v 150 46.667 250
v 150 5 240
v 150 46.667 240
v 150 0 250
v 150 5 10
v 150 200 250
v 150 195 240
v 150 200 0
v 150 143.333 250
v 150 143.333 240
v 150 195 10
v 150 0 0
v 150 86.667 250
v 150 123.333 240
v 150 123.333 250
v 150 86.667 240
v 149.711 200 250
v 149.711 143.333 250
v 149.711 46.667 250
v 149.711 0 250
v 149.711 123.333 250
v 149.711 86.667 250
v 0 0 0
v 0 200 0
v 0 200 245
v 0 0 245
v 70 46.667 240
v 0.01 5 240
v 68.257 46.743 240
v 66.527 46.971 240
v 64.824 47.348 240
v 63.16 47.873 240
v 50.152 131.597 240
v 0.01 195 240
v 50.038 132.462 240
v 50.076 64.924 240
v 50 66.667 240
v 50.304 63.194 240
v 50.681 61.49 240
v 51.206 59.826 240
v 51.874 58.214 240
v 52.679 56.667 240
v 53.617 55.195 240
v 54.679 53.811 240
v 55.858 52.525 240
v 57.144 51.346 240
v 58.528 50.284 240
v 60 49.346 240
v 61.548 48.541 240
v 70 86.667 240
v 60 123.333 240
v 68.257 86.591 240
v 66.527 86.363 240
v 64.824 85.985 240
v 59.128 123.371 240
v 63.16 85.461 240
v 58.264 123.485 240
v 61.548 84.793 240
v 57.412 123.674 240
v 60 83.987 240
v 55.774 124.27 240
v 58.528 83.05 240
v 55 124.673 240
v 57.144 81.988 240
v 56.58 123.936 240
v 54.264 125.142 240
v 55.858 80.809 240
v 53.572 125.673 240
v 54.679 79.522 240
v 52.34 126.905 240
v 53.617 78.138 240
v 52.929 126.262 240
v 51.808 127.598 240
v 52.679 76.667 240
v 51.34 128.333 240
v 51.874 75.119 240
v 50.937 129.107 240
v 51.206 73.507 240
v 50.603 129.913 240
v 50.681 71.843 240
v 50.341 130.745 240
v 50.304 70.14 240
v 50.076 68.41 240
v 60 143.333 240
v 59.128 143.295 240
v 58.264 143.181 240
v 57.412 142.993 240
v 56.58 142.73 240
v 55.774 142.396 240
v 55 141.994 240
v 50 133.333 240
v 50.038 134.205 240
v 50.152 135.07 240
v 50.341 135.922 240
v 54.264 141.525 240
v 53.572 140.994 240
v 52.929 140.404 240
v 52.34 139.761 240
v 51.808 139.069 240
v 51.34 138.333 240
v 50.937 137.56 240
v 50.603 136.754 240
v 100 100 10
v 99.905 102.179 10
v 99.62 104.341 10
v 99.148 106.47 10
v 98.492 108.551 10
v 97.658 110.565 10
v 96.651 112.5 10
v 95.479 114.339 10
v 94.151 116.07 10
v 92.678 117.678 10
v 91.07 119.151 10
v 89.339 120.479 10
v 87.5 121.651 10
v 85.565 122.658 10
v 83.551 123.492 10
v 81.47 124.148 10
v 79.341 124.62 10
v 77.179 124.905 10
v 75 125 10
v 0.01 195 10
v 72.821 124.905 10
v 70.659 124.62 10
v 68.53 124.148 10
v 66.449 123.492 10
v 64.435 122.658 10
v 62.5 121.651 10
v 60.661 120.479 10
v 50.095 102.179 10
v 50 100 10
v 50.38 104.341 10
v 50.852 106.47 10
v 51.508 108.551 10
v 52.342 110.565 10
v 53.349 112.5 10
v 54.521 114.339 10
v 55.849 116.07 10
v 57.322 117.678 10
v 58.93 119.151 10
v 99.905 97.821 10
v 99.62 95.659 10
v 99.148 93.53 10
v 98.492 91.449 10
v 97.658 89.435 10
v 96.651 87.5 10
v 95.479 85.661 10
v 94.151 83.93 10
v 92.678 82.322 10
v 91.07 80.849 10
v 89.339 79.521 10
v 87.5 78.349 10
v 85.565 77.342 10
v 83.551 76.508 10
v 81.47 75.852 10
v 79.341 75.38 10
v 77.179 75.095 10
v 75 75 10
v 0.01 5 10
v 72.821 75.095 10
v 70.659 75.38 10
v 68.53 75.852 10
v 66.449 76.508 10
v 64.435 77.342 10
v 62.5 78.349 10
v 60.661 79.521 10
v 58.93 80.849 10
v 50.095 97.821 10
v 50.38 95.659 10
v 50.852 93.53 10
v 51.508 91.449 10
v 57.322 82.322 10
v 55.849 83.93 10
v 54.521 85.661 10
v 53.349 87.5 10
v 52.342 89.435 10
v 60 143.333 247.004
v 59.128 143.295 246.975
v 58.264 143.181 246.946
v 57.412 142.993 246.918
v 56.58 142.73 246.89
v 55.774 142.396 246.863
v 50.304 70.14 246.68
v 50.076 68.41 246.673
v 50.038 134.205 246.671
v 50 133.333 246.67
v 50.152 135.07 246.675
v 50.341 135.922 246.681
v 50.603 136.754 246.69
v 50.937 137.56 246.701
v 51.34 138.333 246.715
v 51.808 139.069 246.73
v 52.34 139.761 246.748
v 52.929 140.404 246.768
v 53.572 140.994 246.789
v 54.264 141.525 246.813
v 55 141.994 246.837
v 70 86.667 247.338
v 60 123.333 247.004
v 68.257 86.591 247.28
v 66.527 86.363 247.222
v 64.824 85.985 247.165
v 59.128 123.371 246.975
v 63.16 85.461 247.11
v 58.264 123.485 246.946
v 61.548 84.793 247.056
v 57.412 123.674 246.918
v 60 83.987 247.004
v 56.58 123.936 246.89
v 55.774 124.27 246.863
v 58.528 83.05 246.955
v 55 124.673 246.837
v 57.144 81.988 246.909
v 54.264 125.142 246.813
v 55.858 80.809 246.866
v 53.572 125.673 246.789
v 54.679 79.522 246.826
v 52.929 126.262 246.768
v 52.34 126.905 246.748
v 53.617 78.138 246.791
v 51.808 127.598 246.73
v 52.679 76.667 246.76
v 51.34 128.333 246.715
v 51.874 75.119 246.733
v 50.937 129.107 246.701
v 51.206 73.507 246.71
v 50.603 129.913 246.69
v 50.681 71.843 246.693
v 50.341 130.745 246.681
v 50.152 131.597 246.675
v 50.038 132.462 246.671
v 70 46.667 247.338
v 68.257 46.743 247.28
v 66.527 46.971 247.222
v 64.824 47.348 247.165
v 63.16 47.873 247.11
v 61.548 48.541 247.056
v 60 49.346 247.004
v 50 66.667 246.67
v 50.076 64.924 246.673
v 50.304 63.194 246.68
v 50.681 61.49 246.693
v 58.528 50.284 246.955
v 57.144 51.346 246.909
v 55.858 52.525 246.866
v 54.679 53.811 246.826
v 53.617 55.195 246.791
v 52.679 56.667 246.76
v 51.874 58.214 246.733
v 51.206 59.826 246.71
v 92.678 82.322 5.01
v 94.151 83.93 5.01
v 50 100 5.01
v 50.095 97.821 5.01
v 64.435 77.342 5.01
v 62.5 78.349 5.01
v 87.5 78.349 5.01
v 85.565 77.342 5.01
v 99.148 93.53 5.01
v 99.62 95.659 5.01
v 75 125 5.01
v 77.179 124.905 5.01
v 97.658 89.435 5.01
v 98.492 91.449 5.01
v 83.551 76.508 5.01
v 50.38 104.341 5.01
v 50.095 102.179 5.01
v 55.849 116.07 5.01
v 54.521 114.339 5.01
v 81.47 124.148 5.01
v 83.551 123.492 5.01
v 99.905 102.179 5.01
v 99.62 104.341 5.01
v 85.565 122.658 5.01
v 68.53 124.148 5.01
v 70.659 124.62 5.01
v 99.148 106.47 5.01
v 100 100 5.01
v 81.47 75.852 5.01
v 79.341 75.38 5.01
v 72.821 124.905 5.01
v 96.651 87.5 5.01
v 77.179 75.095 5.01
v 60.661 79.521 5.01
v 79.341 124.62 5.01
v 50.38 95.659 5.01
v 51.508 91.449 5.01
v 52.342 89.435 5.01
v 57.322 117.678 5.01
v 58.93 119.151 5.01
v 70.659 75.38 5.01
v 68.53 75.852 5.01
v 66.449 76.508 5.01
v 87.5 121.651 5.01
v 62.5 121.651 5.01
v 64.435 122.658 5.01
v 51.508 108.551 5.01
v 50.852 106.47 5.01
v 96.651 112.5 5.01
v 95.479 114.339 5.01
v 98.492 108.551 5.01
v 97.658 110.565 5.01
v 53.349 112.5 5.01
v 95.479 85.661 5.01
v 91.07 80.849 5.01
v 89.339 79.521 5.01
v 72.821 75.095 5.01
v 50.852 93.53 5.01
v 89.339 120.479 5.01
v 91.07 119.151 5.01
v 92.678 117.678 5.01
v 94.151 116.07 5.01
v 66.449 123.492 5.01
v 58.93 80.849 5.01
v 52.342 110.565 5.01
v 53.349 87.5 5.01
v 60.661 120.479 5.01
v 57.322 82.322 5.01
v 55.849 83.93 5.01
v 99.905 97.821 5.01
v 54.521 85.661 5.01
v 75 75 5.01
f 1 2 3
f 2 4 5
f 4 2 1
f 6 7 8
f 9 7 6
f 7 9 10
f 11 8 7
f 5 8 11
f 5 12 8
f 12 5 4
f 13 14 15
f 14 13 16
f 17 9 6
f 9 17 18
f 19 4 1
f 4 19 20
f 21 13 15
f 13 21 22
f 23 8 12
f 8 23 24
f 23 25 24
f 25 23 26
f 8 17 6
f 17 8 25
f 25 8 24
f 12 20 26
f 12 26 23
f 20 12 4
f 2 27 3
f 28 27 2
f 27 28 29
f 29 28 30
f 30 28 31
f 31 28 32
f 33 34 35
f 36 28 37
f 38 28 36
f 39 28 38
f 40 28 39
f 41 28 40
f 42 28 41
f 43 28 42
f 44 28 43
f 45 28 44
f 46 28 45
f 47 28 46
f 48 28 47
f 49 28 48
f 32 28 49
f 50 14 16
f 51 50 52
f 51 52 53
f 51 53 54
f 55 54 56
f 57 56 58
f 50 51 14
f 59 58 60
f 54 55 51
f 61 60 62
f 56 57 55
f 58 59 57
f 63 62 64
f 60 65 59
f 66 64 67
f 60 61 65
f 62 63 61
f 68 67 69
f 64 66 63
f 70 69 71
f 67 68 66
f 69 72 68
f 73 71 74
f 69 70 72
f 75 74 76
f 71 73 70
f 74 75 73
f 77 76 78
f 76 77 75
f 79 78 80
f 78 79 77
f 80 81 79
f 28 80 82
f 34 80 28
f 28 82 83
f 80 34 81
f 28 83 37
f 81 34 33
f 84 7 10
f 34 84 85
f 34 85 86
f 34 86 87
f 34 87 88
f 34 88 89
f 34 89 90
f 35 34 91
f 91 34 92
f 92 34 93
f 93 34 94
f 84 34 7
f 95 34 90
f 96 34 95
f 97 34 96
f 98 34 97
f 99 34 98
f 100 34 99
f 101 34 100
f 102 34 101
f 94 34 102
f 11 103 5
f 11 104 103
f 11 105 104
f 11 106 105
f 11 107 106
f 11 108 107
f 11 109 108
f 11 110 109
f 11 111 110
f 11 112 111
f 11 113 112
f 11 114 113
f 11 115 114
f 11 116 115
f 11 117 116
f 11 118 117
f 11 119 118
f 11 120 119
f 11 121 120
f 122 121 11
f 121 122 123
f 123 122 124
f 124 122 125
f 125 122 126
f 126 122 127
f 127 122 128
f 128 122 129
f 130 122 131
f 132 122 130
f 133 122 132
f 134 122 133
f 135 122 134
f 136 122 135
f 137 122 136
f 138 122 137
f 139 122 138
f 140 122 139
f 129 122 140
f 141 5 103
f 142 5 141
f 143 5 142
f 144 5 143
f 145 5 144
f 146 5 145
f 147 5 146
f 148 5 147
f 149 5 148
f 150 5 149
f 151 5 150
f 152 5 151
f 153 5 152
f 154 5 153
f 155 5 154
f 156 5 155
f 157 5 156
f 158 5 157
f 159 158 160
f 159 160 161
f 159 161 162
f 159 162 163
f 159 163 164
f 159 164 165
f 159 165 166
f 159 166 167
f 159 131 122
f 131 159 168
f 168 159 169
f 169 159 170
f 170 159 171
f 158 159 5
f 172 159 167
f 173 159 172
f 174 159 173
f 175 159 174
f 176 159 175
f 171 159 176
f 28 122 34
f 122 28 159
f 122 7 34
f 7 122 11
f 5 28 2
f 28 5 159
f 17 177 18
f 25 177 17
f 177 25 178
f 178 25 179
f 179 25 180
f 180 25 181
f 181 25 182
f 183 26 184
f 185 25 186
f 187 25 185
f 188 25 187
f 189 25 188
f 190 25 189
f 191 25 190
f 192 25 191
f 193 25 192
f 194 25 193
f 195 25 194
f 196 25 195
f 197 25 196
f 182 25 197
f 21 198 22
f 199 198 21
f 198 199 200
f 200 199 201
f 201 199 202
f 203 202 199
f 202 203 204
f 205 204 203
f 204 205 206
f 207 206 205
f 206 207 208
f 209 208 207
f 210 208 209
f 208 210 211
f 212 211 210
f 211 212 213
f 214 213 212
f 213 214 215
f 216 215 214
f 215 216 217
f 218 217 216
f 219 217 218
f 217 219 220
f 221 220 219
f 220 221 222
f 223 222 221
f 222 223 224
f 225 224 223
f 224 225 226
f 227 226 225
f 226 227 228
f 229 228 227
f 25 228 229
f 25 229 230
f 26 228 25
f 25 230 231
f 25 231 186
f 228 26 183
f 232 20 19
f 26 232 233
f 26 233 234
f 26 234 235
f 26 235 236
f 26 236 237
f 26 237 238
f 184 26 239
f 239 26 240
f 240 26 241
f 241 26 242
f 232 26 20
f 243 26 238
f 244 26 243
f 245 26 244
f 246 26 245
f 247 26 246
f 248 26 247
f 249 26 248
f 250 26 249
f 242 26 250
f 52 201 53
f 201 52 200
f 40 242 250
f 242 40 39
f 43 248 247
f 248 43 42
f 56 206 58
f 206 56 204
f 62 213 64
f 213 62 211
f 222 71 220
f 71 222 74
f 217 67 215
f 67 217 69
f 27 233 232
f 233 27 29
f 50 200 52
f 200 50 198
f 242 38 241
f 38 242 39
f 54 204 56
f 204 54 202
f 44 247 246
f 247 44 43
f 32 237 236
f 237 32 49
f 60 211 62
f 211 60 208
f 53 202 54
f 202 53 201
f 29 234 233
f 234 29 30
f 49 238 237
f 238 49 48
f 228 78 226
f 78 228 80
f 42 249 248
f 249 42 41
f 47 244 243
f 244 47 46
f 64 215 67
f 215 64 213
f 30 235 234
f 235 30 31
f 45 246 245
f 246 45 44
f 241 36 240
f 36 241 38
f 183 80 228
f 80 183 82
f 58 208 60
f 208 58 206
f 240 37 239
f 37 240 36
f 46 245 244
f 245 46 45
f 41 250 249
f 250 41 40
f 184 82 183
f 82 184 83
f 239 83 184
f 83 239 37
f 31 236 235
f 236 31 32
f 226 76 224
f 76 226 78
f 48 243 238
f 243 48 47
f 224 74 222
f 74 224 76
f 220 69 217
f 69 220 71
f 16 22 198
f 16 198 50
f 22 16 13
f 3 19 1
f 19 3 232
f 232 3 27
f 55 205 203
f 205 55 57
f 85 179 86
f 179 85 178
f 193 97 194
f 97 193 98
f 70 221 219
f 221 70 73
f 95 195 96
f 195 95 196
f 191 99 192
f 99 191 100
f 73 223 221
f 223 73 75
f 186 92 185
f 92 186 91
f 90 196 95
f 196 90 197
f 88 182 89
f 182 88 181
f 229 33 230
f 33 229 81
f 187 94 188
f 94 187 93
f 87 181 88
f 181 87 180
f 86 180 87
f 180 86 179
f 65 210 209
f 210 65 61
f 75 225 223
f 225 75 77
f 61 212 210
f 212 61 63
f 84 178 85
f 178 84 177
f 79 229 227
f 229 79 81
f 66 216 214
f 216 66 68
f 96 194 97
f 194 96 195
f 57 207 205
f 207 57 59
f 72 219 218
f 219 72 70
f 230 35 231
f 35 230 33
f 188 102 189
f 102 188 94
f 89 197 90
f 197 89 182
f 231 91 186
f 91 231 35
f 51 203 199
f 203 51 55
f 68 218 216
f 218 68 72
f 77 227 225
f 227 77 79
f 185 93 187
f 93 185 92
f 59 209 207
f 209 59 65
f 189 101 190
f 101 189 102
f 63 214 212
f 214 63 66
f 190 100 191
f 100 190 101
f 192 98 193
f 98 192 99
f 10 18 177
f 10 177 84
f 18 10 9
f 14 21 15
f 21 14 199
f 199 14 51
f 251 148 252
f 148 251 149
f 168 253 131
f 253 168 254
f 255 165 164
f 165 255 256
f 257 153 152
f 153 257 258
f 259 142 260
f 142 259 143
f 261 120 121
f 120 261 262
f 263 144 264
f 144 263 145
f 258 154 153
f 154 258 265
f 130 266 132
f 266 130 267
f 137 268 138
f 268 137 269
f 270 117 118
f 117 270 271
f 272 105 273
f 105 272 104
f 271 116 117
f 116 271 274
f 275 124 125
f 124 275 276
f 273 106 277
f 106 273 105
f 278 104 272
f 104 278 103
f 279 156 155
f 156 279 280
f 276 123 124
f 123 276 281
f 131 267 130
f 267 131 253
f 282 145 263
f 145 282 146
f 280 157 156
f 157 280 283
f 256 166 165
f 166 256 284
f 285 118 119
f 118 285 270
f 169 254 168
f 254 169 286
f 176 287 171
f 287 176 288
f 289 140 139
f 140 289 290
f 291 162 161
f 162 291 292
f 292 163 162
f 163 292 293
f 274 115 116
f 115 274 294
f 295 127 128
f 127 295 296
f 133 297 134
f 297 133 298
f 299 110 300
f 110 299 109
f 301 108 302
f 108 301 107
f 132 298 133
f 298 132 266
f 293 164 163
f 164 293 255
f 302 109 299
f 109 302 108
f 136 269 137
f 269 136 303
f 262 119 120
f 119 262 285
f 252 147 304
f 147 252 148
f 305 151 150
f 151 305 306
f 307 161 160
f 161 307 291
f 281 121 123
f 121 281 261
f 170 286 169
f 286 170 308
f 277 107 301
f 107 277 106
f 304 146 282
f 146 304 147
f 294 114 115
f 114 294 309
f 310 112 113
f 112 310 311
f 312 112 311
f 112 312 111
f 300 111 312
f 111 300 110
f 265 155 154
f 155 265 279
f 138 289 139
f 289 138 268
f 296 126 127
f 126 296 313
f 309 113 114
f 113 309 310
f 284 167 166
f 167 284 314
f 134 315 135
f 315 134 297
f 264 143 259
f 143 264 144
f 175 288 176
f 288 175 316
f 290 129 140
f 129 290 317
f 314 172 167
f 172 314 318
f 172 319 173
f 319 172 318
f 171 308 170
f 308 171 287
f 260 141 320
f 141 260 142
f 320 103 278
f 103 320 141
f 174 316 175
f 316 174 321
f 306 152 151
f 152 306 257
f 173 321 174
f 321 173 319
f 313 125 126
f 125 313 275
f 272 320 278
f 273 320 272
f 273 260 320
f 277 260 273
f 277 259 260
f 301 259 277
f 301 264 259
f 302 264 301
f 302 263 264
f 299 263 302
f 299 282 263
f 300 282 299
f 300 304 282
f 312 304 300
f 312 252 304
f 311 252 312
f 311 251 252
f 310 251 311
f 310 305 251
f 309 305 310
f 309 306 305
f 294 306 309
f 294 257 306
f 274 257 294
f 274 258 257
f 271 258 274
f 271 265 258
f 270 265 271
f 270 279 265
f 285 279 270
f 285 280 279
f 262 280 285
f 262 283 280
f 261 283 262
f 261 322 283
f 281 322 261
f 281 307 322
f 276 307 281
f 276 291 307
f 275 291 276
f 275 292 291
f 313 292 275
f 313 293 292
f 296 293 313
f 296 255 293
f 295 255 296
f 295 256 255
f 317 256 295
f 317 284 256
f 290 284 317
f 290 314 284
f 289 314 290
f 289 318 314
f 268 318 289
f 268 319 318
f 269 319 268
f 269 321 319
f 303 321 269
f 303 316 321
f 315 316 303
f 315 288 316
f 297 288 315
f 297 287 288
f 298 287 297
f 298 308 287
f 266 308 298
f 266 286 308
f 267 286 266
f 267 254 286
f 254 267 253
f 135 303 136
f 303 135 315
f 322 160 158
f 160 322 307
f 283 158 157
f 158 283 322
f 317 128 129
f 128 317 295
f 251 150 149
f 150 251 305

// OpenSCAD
// Smoothness of generated output
nozzle_diameter = 0.4;
$fs = nozzle_diameter / 2;
$fa = 5;

// Wall thickness
thickness = 5.0;
height = 250.0;
width = 200.0;
depth = 150.0;
bowl_diameter = 50.0;
brush_cutout_diameter = 40.0;
razor_cutout_diameter = 20.0;
// Smoothing is INCREDIBLY slow.
should_smooth = false;

fudge = 0.01;

module angle_slice() {
        CubePoints = [
          [ 0, 0, 0 ],
          [ depth+fudge*2, 0, thickness+fudge ],
          [ depth+fudge*2, width+fudge*2, thickness+fudge ],
          [ 0, width+fudge*2, 0 ],
          [ 0, 0, thickness+fudge*2 ],
          [ depth+fudge*2, 0, thickness+fudge ],
          [ depth+fudge*2, width+fudge*2, thickness+fudge ],
          [ 0, width+fudge*2, thickness+fudge ]];

        CubeFaces = [
          [0,1,2,3],
          [4,5,1,0],
          [7,6,5,4],
          [5,6,2,1],
          [6,7,3,2],
          [7,4,0,3]];

        polyhedron( CubePoints, CubeFaces );
}

module stand() {
    difference() {
        cube([depth, width, height]);
        translate([fudge,thickness,thickness*2])
        cube([depth+fudge,width-thickness*2,height-thickness*4]);
        translate([-fudge,-fudge,height-thickness])
        angle_slice();
    }
}

module bowl_cutout() {
    translate([depth/2,width/2,thickness+fudge])
    cylinder(h=thickness+fudge, d = bowl_diameter);
}

module top_cutout(cutout_diameter) {
    translate([cutout_diameter/2,0,-thickness])
    union() {
        cylinder(h=thickness*2+fudge*2, d = cutout_diameter);
        translate([0,-cutout_diameter/2,0])
        cube([depth, cutout_diameter,thickness*2+fudge*2]);
    }
}

module unsmoothed_object() {
    difference() {
        stand();
        translate([depth/3,width/3,height-thickness-fudge])
        top_cutout(brush_cutout_diameter);
        translate([depth/3,width*2/3,height-thickness-fudge])
        top_cutout(razor_cutout_diameter);
        bowl_cutout();
    }
}

if (should_smooth) {
    minkowski() {
        unsmoothed_object();
        cylinder(r=smooth_rad,h=1);
        cylinder(d=5,h=1);
    }
} else {
    unsmoothed_object();
}
